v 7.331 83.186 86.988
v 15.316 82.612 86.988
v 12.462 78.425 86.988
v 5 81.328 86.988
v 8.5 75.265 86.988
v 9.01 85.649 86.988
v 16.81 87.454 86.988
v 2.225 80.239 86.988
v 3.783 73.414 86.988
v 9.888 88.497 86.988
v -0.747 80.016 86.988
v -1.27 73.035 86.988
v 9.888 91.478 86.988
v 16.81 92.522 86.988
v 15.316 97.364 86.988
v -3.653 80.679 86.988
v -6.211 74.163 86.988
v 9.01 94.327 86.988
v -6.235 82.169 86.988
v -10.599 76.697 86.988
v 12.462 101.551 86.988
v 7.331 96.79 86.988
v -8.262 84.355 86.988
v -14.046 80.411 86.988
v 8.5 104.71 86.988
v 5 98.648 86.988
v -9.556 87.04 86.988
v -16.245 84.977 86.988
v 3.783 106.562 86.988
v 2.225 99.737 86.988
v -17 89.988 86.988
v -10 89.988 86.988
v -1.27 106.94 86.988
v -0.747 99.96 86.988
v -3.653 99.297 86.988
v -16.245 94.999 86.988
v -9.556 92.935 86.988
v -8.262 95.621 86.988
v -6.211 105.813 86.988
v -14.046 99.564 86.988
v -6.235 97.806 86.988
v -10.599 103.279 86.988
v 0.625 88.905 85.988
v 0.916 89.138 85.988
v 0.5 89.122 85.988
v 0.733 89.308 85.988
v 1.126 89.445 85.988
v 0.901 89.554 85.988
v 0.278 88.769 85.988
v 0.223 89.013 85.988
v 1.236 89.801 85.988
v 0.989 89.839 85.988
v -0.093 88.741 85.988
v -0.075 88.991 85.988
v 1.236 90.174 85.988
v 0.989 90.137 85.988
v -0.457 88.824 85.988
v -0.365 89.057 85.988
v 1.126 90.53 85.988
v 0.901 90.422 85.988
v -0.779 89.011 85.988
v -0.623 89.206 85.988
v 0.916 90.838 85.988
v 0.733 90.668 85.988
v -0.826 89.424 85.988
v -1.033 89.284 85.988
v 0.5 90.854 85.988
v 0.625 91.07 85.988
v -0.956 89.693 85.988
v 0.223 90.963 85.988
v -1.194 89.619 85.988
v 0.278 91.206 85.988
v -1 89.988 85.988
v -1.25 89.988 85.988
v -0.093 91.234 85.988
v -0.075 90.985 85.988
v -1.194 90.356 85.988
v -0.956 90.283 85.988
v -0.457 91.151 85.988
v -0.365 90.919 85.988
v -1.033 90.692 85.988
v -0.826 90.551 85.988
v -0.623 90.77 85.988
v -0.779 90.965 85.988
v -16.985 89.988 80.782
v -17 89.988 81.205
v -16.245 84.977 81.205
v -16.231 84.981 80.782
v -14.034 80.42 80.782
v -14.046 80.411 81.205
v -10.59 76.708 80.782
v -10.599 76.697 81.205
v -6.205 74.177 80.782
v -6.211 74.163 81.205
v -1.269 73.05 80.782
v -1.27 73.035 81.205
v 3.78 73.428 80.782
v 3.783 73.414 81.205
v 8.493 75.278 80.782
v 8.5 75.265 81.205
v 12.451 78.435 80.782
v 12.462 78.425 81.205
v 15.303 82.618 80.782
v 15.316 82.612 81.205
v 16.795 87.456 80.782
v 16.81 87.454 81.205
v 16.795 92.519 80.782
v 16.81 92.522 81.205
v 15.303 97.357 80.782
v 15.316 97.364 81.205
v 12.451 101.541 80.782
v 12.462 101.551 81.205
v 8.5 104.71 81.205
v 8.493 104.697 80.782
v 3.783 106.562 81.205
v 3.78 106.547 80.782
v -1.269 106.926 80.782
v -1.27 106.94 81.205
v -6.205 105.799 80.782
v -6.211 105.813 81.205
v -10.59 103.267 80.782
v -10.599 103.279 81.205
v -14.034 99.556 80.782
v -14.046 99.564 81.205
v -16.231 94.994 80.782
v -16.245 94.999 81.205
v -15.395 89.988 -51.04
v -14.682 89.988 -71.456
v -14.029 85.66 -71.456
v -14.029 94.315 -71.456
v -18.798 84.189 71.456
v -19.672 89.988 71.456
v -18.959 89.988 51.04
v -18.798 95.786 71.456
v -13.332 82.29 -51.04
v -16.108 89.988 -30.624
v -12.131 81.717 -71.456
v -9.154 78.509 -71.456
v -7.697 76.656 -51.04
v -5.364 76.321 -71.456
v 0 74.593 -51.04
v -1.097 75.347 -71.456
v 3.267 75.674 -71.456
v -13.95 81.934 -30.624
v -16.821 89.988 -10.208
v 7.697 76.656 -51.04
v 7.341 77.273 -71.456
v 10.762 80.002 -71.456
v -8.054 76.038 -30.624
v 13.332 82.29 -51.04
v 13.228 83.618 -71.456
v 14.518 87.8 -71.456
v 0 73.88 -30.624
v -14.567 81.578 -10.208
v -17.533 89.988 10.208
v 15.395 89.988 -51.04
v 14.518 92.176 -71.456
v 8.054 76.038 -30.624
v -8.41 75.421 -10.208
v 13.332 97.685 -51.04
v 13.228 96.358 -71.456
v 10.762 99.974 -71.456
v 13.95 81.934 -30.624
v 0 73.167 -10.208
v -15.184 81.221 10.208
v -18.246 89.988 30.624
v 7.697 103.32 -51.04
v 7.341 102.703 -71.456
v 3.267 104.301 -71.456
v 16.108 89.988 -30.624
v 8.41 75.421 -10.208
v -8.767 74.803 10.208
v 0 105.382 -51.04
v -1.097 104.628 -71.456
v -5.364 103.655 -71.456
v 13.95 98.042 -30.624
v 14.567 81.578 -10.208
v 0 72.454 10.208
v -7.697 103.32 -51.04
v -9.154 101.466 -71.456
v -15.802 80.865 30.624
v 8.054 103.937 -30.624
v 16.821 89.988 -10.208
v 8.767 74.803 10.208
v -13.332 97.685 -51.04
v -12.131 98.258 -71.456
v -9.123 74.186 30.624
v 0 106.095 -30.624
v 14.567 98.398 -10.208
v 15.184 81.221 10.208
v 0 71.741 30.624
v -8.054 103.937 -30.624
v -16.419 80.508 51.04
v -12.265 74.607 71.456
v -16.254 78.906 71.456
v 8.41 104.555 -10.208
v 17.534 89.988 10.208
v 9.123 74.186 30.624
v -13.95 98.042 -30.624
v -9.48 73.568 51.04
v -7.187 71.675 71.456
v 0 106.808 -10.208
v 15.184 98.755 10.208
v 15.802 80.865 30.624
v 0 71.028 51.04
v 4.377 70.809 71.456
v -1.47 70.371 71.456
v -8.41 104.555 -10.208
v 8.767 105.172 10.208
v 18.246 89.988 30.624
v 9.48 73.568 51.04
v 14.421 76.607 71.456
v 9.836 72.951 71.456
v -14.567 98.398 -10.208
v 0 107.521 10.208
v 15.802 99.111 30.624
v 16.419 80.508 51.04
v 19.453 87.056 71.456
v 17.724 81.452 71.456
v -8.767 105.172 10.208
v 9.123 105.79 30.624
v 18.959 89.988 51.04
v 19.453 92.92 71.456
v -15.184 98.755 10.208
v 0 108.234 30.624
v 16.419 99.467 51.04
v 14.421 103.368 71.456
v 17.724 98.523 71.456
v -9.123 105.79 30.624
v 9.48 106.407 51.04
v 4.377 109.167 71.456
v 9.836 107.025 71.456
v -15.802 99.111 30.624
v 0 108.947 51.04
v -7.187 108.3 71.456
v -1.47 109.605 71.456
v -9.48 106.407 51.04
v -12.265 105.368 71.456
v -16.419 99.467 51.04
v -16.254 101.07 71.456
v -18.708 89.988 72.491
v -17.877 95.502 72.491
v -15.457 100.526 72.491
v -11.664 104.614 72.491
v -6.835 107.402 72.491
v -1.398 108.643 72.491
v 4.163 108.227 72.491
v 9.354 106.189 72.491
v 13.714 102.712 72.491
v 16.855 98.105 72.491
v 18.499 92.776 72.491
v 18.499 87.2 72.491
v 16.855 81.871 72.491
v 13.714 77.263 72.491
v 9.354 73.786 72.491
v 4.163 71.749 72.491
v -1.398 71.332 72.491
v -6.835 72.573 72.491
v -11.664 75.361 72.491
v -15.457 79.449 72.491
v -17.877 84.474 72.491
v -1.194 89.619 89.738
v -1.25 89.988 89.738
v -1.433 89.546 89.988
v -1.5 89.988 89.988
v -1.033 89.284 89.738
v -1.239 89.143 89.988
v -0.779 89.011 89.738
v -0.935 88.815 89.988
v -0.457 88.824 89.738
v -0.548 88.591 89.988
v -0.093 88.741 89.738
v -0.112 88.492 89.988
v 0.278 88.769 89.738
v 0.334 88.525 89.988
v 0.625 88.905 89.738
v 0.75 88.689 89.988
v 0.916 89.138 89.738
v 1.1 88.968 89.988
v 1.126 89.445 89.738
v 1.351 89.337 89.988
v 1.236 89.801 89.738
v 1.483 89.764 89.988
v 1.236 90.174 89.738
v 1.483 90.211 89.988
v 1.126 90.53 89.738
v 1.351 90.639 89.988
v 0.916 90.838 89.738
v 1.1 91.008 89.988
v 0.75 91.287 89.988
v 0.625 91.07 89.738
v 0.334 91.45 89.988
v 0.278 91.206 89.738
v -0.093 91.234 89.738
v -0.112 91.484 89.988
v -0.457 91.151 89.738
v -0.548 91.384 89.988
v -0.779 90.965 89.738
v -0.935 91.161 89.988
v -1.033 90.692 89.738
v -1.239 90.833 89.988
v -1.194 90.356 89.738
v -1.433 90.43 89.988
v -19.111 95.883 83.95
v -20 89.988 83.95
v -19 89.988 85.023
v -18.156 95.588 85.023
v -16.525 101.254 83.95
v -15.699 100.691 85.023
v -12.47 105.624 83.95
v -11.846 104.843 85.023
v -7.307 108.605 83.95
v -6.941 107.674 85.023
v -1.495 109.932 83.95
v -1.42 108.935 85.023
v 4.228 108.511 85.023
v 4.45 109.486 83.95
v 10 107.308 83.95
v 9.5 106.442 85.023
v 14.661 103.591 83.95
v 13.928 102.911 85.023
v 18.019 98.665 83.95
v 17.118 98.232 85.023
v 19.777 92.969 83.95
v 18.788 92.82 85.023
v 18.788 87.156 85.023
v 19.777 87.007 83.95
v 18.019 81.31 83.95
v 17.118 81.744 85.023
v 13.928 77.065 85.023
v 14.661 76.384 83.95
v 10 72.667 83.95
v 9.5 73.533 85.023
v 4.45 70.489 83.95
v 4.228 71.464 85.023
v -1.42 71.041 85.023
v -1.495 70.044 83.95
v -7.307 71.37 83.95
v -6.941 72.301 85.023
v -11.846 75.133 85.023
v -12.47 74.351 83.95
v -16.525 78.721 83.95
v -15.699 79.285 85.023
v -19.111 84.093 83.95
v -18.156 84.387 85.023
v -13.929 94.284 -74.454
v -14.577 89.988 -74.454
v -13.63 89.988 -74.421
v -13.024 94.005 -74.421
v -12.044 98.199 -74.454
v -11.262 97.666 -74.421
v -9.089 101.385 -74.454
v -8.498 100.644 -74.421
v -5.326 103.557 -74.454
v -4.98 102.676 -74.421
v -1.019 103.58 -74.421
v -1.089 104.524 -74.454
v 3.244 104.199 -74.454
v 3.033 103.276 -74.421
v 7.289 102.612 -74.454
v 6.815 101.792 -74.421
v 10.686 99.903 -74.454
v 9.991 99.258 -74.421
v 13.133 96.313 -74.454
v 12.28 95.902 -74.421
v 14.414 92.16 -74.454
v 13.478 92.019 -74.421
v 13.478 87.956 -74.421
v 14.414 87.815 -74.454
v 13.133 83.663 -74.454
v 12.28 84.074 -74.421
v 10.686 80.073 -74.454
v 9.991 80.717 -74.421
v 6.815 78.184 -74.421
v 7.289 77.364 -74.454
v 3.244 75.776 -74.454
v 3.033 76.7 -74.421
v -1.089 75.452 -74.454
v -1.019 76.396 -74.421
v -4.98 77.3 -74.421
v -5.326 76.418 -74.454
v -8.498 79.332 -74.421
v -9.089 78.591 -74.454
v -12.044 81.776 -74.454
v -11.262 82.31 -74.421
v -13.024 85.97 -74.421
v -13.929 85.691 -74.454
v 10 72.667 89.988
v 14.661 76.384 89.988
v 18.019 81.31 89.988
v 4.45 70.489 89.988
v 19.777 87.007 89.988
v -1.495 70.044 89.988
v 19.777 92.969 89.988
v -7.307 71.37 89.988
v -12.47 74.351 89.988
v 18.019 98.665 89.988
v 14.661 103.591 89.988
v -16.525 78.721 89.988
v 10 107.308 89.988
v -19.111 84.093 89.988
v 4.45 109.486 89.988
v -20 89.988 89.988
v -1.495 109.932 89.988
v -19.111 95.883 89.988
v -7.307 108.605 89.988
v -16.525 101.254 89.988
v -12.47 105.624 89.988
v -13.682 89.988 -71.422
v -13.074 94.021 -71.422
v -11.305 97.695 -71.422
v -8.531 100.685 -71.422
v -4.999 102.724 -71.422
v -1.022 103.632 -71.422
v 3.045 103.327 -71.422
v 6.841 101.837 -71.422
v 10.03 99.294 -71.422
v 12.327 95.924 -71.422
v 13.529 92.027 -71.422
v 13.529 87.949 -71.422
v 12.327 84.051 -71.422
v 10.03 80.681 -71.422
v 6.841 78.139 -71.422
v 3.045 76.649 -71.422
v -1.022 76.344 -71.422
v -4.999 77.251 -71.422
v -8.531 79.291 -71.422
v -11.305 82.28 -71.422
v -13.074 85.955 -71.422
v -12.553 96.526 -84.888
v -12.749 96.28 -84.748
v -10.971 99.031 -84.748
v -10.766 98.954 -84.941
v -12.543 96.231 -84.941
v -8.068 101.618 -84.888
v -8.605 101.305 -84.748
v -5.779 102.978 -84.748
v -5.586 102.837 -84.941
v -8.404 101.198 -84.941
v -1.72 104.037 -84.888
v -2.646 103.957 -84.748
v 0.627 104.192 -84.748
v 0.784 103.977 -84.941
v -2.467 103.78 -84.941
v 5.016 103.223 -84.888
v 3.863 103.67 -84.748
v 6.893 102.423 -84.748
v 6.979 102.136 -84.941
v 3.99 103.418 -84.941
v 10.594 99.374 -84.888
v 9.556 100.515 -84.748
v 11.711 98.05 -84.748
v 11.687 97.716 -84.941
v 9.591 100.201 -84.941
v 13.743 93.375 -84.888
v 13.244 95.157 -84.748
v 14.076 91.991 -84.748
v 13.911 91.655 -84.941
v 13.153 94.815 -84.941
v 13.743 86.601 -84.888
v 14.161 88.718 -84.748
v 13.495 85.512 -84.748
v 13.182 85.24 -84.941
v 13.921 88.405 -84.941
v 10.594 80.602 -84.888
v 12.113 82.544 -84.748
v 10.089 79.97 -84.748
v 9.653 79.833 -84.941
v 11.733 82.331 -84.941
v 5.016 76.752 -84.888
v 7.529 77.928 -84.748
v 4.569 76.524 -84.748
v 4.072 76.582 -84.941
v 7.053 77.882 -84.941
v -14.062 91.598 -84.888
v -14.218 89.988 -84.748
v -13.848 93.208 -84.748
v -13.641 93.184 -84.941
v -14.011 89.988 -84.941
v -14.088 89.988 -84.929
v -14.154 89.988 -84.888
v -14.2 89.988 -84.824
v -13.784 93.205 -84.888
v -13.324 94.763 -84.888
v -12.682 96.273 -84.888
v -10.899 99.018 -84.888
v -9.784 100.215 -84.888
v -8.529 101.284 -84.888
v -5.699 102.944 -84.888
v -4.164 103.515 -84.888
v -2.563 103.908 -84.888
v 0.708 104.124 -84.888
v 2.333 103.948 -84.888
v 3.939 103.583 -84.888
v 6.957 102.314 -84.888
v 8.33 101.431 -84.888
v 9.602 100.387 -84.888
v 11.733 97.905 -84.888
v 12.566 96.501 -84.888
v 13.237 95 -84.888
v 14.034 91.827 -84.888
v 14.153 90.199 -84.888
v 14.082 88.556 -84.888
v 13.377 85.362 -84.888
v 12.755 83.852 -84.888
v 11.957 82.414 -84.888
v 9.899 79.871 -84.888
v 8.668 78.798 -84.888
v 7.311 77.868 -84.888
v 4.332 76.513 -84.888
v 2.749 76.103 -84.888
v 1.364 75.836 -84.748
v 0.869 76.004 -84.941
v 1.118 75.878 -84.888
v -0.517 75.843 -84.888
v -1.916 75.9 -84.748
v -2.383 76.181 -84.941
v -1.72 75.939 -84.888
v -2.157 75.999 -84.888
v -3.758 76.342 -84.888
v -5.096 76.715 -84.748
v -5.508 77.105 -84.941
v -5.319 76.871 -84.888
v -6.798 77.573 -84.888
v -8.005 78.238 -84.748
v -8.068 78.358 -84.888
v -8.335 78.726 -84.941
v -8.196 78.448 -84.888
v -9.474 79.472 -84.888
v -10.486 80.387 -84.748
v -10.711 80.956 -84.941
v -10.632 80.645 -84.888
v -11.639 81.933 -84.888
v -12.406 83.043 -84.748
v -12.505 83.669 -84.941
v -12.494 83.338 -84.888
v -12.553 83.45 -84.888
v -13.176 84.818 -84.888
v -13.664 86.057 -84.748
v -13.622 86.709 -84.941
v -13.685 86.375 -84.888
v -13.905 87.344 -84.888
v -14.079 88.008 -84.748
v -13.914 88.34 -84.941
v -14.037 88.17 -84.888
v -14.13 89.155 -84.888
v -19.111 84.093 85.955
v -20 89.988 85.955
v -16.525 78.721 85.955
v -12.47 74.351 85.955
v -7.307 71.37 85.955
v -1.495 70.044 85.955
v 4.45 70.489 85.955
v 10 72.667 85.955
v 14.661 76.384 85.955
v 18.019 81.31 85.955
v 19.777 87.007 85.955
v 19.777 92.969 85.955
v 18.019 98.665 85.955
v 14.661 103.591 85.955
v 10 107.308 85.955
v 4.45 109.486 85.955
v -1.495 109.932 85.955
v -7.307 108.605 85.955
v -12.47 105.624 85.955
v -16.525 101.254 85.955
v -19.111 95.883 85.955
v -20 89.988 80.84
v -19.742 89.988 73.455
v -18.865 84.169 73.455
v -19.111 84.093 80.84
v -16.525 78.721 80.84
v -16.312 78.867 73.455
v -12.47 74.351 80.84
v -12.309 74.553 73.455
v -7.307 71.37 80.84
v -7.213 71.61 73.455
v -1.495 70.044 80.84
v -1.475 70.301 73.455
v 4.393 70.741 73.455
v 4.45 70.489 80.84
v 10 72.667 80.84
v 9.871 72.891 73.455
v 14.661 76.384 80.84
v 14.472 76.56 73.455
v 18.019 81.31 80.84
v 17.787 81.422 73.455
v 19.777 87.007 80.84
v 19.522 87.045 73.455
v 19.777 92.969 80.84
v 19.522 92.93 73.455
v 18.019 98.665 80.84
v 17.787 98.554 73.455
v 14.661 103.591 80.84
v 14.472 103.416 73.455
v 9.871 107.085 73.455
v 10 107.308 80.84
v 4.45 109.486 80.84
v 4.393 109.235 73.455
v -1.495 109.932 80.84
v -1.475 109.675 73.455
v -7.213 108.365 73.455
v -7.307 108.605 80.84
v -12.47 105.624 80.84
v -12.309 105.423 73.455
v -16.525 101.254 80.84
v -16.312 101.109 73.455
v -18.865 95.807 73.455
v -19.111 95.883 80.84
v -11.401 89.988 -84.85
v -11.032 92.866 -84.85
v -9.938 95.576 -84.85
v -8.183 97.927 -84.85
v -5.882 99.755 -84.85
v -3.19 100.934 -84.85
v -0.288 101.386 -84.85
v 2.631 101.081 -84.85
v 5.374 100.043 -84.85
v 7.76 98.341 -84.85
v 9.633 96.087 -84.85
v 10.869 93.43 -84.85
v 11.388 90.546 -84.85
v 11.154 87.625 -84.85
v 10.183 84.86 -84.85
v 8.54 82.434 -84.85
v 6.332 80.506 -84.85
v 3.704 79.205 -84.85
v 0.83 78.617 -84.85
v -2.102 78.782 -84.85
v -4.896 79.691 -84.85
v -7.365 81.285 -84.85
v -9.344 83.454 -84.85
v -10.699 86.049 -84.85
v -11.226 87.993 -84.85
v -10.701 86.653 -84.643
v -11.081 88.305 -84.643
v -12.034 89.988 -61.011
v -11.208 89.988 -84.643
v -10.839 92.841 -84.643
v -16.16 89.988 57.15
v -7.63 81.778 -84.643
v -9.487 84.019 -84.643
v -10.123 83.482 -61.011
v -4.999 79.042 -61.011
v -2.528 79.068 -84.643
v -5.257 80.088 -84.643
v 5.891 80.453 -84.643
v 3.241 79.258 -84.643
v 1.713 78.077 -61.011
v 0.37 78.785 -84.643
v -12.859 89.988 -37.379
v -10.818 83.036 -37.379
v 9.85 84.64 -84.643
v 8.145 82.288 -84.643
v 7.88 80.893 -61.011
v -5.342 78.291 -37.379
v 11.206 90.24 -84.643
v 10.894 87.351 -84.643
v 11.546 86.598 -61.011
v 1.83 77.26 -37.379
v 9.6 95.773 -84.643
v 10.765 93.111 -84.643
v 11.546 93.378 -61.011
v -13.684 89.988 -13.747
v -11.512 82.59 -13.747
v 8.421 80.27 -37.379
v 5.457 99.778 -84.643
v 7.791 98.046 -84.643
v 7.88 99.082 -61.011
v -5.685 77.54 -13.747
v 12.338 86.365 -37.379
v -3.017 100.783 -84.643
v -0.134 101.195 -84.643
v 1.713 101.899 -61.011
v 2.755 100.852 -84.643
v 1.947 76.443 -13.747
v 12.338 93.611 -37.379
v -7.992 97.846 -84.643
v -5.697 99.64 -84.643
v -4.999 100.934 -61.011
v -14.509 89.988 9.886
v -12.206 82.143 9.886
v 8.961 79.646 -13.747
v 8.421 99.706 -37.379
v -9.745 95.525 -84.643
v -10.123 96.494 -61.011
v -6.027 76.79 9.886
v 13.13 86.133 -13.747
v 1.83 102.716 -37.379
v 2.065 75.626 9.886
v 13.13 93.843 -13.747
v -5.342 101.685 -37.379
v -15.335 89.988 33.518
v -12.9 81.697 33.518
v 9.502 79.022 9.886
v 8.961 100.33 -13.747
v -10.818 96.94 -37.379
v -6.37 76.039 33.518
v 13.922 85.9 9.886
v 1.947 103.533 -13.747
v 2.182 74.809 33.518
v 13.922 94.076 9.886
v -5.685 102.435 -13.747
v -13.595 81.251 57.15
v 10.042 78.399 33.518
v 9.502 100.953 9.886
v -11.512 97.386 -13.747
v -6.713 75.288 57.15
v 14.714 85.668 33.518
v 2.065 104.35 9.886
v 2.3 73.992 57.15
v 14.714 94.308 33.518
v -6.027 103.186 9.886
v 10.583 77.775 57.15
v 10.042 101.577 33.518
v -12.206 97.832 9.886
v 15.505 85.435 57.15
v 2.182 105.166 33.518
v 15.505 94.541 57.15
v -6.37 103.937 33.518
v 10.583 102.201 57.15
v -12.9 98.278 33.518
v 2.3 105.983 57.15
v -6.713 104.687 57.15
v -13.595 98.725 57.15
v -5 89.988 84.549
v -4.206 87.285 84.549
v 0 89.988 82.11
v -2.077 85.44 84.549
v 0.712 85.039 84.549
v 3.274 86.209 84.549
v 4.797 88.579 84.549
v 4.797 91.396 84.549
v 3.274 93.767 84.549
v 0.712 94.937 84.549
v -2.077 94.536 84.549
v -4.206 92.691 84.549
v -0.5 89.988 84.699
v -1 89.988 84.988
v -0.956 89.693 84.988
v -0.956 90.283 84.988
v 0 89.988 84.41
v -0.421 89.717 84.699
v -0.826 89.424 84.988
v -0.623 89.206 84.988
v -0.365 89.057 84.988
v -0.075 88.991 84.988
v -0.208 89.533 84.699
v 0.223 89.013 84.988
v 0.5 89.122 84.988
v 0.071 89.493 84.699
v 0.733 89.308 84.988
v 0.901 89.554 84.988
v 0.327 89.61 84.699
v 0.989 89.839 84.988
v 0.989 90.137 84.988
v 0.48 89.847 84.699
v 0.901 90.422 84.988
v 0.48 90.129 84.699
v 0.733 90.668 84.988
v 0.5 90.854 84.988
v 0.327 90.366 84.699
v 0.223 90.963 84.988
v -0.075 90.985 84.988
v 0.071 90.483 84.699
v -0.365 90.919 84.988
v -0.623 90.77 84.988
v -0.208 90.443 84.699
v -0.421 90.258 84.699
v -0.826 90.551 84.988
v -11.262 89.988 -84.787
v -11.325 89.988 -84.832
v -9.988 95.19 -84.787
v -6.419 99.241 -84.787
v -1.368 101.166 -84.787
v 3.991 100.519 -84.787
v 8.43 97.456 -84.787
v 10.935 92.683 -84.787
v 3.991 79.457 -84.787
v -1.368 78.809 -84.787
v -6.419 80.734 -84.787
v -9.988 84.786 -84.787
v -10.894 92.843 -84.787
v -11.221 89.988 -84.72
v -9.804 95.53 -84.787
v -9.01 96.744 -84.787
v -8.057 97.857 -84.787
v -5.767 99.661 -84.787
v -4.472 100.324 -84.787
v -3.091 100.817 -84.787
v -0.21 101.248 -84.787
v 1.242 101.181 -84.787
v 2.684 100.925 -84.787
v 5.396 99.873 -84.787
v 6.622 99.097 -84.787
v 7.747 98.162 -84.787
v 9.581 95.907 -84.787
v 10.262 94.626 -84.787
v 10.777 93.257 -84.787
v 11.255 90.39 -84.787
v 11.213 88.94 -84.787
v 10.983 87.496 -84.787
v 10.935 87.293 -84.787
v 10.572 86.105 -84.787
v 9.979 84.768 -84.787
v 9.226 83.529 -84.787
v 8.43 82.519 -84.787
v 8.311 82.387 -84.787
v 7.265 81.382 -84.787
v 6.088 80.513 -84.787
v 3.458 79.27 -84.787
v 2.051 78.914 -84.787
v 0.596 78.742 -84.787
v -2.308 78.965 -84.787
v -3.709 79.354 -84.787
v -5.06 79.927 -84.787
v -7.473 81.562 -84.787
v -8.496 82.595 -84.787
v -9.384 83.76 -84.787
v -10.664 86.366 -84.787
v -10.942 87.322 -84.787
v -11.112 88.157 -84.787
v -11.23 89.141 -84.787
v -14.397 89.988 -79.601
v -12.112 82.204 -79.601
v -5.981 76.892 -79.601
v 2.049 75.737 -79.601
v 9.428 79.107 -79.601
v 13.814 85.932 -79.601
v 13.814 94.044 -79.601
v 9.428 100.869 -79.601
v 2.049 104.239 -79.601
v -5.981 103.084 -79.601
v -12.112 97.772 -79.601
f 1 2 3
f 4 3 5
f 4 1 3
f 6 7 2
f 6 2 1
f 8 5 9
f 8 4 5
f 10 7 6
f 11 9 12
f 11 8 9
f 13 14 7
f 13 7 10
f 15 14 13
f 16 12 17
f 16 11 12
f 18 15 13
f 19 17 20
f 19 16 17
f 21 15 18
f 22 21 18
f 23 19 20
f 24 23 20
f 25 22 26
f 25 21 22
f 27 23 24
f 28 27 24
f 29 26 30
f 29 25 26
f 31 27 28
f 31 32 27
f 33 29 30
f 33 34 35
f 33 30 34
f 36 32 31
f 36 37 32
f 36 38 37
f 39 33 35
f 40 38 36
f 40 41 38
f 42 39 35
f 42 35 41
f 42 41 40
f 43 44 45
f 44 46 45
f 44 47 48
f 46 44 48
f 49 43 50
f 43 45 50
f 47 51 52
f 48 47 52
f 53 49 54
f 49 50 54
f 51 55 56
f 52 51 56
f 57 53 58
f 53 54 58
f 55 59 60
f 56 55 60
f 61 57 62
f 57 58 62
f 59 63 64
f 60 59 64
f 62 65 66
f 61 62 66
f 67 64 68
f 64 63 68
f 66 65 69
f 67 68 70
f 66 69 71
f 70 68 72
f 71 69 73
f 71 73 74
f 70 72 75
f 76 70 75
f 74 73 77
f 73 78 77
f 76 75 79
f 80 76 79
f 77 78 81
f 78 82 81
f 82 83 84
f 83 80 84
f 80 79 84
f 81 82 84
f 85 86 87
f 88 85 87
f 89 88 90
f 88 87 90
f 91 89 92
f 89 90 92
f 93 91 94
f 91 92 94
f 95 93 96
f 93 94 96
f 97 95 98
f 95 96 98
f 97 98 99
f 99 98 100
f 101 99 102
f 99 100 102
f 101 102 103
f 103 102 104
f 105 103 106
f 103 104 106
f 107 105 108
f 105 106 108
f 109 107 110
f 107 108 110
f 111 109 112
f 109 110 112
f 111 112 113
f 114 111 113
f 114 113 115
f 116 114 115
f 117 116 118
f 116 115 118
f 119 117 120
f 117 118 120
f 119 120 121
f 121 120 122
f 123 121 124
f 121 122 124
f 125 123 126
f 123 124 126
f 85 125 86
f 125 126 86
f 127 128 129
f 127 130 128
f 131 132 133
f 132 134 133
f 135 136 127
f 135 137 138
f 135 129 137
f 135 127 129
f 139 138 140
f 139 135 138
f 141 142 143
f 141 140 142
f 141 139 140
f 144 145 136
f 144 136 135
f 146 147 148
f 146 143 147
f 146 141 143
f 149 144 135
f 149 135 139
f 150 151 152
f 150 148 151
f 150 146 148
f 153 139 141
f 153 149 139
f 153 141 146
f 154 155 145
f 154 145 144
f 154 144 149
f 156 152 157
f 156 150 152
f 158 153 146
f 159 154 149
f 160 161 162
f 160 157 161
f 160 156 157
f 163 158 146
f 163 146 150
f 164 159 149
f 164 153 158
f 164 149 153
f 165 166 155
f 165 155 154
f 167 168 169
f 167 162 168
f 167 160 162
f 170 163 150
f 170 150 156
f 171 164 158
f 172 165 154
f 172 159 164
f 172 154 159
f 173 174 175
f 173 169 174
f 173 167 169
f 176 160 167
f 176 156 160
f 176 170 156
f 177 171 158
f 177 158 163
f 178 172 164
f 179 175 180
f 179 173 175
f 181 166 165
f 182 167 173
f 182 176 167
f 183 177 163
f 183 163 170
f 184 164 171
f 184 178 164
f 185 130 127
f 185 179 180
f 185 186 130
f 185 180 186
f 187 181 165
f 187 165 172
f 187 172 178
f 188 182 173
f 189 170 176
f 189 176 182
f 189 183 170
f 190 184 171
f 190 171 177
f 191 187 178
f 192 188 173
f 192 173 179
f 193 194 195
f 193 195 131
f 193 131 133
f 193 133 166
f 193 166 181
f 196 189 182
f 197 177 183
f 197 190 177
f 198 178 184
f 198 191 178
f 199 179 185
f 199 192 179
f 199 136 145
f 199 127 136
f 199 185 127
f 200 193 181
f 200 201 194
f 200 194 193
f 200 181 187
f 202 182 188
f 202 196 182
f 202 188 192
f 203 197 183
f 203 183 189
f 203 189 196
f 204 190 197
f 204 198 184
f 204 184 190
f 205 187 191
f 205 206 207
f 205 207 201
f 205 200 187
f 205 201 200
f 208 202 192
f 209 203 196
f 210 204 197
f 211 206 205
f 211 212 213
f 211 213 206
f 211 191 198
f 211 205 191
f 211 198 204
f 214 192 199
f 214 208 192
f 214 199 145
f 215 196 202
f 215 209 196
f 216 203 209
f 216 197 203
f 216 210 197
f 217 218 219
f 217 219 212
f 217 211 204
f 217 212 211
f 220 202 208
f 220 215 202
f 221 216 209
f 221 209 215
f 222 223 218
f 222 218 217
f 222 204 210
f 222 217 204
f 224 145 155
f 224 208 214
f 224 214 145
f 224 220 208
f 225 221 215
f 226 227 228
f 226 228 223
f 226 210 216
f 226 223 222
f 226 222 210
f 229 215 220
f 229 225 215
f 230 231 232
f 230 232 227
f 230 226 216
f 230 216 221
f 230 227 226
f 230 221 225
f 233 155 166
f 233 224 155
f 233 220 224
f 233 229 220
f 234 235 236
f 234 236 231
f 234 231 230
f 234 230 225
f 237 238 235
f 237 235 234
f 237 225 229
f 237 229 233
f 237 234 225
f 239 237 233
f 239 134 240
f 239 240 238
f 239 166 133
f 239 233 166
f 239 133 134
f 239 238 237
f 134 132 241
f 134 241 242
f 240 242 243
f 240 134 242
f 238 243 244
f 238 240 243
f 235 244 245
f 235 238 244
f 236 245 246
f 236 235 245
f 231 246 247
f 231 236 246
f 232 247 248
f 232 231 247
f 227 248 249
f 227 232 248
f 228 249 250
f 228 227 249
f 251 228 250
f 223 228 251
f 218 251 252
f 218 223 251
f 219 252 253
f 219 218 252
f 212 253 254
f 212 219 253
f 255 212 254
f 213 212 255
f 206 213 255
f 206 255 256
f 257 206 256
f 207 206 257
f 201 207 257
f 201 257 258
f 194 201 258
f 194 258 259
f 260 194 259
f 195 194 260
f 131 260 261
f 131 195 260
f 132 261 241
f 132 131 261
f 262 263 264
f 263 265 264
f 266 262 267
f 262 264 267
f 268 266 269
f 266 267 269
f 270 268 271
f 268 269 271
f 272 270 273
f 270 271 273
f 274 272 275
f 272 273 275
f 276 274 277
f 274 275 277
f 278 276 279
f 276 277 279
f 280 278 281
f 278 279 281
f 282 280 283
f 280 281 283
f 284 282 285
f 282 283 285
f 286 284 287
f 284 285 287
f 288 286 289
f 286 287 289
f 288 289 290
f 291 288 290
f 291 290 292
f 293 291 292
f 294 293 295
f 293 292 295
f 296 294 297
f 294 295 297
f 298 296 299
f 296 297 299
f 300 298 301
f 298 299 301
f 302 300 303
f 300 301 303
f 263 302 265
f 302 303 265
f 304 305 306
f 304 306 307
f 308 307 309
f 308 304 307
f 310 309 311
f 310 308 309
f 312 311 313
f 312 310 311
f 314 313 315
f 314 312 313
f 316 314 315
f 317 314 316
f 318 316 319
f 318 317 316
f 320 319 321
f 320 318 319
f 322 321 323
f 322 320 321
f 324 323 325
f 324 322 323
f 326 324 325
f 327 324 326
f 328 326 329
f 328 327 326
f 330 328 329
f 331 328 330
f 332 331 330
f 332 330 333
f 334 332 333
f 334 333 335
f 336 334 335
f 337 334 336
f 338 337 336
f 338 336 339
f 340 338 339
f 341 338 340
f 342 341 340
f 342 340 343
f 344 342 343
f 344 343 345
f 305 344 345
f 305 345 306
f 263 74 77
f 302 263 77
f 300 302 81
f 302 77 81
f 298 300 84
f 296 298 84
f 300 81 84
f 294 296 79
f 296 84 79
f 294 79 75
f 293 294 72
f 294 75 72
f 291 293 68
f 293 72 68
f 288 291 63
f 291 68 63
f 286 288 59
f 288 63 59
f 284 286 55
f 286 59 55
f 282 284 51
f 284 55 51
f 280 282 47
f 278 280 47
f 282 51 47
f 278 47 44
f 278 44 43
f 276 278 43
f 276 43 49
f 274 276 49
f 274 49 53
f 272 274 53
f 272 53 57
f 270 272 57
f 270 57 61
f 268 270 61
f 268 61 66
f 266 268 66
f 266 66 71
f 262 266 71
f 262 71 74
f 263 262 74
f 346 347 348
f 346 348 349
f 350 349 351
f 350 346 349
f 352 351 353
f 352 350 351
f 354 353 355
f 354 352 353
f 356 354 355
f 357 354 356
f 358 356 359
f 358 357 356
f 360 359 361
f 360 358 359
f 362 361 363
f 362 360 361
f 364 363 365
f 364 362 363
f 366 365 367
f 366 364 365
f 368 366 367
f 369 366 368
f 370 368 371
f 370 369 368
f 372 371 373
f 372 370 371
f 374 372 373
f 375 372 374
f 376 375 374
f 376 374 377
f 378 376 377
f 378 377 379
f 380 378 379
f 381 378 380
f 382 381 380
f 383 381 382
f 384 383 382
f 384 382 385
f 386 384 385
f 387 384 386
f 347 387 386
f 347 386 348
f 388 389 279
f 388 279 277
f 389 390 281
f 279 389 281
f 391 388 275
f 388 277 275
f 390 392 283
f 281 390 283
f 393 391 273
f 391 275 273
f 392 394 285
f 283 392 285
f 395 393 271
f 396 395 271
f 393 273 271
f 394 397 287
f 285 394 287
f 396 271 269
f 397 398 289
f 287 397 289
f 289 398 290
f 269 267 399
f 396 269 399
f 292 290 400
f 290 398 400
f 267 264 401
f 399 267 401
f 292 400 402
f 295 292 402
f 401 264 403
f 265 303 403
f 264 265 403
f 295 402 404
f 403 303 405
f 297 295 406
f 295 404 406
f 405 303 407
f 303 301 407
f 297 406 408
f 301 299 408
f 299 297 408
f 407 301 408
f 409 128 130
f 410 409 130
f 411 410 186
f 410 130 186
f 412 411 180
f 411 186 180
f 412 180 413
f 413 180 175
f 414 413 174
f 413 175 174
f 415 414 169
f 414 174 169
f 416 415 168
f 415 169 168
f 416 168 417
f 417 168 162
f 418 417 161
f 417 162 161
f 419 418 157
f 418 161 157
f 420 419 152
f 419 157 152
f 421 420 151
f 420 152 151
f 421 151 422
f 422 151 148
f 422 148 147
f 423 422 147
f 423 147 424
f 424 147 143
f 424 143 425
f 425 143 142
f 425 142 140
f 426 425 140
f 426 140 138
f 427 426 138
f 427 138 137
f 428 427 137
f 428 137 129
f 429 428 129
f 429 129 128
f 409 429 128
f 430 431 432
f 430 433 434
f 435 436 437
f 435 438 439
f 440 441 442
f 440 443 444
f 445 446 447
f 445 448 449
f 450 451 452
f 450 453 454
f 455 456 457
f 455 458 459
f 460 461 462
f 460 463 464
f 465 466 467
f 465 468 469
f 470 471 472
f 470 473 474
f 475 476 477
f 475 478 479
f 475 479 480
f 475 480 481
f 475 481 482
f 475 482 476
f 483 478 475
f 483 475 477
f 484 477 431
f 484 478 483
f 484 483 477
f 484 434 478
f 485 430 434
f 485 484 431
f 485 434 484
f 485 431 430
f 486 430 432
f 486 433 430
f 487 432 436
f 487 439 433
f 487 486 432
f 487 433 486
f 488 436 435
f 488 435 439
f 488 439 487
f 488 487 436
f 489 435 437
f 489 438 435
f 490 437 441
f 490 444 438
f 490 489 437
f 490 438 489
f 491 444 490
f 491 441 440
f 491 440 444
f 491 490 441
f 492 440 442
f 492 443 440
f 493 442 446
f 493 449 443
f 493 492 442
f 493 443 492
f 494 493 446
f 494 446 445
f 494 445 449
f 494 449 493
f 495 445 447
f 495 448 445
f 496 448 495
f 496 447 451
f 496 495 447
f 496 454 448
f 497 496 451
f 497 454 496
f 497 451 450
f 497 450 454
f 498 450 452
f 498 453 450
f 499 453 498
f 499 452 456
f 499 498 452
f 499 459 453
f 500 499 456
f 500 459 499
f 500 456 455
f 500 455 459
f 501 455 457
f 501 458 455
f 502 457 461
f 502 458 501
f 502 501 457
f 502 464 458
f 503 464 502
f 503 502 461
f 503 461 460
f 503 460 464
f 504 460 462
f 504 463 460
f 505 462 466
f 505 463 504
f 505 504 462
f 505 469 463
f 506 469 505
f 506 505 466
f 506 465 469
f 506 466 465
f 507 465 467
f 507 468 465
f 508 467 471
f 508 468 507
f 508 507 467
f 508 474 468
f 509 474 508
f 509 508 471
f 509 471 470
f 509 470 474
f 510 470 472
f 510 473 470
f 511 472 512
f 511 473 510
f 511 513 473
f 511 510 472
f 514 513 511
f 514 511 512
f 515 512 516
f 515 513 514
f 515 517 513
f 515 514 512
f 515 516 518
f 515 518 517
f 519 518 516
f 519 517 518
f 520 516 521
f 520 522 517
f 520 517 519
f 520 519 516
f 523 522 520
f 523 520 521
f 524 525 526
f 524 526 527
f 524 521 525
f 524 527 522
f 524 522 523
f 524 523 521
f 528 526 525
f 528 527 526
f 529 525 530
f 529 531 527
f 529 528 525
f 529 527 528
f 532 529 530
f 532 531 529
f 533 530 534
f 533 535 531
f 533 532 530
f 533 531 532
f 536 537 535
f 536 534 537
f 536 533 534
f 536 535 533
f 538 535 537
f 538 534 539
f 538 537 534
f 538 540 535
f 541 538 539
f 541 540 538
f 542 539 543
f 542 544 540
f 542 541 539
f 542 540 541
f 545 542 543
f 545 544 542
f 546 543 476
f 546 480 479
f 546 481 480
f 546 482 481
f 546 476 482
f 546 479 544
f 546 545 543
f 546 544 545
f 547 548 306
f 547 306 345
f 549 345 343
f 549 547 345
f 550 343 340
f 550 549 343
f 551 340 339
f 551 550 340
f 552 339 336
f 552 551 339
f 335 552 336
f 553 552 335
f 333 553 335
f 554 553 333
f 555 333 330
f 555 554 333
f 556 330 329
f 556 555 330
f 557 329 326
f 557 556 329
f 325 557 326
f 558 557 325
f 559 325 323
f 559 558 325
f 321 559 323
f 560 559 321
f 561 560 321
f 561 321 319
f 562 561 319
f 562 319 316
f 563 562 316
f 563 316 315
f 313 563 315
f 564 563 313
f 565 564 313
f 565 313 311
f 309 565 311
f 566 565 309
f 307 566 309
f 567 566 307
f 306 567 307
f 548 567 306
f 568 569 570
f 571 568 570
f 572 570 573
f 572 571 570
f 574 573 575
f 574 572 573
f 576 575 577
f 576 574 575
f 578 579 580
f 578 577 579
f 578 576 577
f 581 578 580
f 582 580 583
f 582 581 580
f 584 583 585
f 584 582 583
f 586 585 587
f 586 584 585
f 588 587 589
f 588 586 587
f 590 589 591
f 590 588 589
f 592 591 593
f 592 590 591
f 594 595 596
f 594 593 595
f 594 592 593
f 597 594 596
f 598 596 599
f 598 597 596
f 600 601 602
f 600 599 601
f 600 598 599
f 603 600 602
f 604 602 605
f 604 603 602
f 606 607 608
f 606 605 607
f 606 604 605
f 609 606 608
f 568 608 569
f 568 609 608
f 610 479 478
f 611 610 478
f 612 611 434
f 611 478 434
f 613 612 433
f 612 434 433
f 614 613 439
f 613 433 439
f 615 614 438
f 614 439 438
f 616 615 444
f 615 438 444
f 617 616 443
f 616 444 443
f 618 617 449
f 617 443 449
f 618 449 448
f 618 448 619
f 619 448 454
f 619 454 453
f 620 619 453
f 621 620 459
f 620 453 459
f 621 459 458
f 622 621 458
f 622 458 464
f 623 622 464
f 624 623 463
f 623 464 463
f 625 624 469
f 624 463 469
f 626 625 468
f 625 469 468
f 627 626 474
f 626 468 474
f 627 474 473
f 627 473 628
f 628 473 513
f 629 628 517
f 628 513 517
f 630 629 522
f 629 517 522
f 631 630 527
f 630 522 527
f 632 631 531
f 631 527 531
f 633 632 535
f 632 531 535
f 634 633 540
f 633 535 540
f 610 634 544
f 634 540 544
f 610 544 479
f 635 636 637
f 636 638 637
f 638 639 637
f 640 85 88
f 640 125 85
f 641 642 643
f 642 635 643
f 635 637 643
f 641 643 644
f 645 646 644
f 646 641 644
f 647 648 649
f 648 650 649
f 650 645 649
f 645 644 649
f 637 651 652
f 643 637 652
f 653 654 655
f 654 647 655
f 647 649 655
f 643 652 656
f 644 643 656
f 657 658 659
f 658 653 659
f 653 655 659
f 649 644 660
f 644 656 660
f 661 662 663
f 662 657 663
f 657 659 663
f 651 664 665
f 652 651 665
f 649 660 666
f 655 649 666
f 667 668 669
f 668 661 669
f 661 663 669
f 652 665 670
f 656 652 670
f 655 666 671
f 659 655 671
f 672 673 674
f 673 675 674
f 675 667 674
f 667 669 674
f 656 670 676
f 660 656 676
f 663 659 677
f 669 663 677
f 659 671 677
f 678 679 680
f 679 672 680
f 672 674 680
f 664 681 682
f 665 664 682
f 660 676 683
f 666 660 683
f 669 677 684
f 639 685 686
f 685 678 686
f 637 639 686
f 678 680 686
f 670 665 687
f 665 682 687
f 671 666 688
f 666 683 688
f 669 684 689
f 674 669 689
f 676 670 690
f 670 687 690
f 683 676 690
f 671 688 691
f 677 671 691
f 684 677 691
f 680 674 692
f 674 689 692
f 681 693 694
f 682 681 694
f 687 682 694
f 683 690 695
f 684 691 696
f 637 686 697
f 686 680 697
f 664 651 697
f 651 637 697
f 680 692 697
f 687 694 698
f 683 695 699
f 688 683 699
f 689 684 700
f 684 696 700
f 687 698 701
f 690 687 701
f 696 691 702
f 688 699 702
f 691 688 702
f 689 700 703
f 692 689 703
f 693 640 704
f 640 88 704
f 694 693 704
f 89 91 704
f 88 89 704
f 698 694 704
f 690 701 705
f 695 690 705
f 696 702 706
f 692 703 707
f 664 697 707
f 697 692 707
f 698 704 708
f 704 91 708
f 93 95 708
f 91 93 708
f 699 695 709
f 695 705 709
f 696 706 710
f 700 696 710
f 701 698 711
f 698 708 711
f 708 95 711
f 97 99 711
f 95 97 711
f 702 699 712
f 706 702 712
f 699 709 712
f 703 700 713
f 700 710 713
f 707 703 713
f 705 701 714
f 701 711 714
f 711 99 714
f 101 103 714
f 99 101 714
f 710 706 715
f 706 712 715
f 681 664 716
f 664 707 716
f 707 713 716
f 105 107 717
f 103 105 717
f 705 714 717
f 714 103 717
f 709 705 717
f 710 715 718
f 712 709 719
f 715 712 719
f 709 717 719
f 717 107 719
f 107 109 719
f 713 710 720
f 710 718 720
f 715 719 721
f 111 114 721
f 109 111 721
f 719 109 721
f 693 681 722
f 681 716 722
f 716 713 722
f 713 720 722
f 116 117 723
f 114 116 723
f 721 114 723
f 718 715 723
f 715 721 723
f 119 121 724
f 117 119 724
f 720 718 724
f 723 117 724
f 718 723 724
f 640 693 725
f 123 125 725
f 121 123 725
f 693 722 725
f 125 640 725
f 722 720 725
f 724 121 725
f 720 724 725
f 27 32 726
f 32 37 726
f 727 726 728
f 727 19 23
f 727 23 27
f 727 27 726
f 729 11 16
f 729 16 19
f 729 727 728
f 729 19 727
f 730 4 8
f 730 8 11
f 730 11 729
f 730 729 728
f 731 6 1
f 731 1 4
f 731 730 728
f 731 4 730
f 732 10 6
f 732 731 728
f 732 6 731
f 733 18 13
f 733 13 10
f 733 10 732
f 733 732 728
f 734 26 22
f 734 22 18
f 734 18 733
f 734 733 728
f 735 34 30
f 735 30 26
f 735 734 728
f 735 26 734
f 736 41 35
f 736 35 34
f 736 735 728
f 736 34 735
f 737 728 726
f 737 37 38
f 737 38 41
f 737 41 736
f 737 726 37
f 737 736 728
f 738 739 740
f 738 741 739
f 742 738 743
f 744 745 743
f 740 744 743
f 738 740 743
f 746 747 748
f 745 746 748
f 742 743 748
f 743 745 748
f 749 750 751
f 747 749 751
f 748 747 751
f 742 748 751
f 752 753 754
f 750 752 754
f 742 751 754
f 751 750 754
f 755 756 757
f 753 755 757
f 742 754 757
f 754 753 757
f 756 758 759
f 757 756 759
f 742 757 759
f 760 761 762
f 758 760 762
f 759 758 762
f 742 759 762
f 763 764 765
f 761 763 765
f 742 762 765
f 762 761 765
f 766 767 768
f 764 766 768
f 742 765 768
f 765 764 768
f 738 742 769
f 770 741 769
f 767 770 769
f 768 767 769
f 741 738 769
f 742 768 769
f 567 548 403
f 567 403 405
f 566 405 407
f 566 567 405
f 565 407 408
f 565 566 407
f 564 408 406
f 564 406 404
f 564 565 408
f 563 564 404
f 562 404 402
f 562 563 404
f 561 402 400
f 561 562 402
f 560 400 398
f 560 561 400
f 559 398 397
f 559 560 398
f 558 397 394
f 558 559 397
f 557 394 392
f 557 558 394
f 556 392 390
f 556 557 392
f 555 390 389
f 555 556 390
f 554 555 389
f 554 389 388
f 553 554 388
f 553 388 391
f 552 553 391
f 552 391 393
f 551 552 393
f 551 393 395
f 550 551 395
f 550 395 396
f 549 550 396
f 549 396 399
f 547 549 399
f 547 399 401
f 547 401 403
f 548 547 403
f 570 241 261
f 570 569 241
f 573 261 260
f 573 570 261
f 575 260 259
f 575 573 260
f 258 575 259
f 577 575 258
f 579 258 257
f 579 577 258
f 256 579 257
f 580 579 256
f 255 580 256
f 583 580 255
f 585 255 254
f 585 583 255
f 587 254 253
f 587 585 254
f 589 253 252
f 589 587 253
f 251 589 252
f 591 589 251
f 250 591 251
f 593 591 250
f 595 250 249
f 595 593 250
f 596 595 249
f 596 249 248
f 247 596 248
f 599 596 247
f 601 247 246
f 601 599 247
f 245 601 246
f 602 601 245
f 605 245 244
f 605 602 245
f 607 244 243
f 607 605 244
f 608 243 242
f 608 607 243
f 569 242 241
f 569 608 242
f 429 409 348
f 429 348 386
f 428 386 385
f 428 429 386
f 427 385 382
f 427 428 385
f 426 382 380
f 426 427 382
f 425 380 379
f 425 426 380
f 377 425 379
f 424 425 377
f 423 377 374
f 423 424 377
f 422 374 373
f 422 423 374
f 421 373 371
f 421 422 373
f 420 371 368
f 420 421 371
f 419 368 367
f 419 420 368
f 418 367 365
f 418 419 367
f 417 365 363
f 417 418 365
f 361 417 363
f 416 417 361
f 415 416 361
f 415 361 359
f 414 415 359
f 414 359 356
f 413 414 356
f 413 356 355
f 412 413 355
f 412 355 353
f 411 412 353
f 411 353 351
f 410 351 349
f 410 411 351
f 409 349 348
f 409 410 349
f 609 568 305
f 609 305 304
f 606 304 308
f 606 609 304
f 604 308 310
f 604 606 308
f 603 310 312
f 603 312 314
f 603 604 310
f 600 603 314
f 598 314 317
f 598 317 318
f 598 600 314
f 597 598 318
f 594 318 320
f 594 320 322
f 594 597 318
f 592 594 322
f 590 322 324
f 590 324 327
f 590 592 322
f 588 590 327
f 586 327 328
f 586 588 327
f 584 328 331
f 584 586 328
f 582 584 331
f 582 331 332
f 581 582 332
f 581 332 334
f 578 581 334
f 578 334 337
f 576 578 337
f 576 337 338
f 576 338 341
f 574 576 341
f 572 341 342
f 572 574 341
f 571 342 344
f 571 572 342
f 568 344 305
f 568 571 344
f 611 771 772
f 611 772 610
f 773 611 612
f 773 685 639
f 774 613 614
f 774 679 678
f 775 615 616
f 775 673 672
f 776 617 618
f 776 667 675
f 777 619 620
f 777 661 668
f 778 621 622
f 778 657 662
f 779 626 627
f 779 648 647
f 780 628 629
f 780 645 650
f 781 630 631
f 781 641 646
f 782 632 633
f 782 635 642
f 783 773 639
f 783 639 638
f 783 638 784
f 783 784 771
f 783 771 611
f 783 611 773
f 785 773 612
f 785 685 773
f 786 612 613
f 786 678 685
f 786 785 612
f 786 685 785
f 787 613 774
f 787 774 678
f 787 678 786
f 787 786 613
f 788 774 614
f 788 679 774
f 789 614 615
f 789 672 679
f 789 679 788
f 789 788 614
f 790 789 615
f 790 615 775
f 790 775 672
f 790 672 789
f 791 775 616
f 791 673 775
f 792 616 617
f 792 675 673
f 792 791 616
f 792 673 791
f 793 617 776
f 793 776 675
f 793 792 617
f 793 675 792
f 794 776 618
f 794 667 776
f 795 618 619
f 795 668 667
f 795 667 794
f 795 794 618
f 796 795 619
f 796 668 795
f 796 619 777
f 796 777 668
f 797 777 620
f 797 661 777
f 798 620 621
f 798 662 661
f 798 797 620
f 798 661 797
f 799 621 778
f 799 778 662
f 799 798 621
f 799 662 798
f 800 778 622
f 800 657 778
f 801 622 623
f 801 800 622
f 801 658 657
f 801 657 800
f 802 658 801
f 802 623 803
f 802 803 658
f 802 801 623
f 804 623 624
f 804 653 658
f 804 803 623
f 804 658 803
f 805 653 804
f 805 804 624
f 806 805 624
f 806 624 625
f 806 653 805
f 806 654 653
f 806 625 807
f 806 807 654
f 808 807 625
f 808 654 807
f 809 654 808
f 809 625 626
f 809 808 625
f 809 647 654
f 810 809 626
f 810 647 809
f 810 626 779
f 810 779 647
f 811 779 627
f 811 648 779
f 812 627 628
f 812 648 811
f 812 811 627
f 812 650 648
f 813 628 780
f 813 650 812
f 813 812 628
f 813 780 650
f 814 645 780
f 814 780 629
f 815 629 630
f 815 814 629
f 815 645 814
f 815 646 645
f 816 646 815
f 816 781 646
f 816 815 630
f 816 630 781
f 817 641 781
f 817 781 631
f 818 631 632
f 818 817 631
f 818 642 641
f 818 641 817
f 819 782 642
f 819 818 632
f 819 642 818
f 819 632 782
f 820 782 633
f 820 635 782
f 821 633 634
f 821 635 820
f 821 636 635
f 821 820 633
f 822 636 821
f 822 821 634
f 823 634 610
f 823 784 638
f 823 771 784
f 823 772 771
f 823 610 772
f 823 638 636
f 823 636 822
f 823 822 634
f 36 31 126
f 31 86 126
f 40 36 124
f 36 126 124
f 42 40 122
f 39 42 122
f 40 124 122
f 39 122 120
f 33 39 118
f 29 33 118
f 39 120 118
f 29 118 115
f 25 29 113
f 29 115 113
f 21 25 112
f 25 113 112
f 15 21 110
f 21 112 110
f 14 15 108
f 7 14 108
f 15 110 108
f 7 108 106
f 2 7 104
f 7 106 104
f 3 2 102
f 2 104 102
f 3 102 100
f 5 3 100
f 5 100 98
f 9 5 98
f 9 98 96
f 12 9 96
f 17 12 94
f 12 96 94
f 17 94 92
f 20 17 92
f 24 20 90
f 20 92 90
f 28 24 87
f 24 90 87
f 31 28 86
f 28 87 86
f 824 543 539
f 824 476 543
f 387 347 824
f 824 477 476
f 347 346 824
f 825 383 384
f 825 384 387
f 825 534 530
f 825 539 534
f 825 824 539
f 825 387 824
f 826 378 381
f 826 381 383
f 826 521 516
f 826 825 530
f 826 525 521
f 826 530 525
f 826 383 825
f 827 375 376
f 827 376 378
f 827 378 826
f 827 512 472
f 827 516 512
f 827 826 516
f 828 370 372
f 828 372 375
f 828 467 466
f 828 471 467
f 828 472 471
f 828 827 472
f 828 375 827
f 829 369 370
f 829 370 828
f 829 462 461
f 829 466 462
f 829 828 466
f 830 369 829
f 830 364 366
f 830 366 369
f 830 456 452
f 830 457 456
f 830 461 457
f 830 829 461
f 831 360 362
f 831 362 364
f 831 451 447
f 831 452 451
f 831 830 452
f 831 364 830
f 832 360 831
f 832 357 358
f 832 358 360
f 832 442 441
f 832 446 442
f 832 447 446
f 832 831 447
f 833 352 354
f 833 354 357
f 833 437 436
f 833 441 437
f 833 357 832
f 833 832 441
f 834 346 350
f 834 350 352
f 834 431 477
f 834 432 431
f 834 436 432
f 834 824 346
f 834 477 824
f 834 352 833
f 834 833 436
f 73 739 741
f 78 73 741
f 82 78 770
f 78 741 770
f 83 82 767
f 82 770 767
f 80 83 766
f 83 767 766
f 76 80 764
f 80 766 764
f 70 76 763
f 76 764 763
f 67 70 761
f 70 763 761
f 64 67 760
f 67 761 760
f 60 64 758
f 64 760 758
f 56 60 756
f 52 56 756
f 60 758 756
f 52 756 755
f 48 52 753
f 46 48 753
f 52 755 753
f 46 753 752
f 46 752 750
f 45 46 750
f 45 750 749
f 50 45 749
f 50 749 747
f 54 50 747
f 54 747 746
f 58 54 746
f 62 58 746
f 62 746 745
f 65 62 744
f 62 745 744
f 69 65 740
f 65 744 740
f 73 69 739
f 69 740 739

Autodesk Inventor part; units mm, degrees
ref_plane "YZ Plane" through (0, 0, 0) normal (1, 0, 0) x (0, 1, 0)
ref_plane "XZ Plane" through (0, 0, 0) normal (0, 1, 0) x (-1, 0, 0)
ref_plane "XY Plane" through (0, 0, 0) normal (0, 0, 1) x (1, 0, 0)
sketch "Sketch1" plane through (0, 0, 0) normal (1, 0, 0) x (0, 1, 0)
  line L0 (-20, 0) -> (174.936, 0)
  line L1 (0, 0) -> (0, -20)
  line L2 (0, -20) -> (9.148, -20)
  line L3 (9.148, -20) -> (174.936, -14.2106)
  line L4 (174.936, 0) -> (174.936, -14.2106)
  line L5 (3, -10) -> (3, -17)
  line L6 (7.8773, 0) -> (3, -10)
  line L7 (7.8773, 0) -> (19.0033, 0) construction
  line L8 (9.2055, 0) -> (9.2055, -16.9852)
  line L9 (8.783, -17) -> (174.936, -11.1978)
  line L10 (3, -17) -> (8.783, -17)
  line L11 (174.936, -14.2106) -> (174.831, -11.2015)
  line L12 (6.0374, -20) -> (4.9651, -19)
  line L13 (4.9651, -19) -> (4.0326, -20)
  line L14 (4.9651, -19) -> (5, -20)
  line L15 (17.532, -19.7072) -> (17.4971, -18.7078)
  line L16 (17.4971, -18.7078) -> (18.5314, -19.6723)
  line L17 (17.4971, -18.7078) -> (16.5326, -19.7421)
  line L18 (164.442, -14.577) -> (161.4443, -14.6817)
  line L19 (161.4443, -14.6817) -> (161.4094, -13.6823)
  line L20 (161.4094, -13.6823) -> (164.4089, -13.6299)
  line L21 (164.4089, -13.6299) -> (164.442, -14.577)
  line L22 (0.5, 0) -> (0.5, -1)
  line L23 (0, -1.5) -> (0.5, -1)
  line L24 (0.5, -1) -> (5, -1)
  line L25 (5, -1) -> (5.5774, 0)
  line L26 (0.25, -1.25) -> (4, -1.25)
  line L27 (4, -1.25) -> (4, 0)
  point P0 (4, -1)
  dimension "d1" = 20
  dimension "d5" = 3
  dimension "d18" = 90
  dimension "d22" = 5
  dimension "d23" = 1
  dimension "d24" = 1
  dimension "d25" = 157.5
  dimension "d26" = 3
  dimension "d27" = 1
  dimension "d28" = 13.5
  dimension "d43" = 88
  dimension "d45" = 17
revolve "Revolution1" add sketch "Sketch1" angle 360 about axis through (0, -20, 0) along (0, 1, 0) contours L23 L26 L27 L24 L25 L0 L6 L5 L10 L9 L11 L3 L21 L20 L19 L16 L17 L2 L12 L13 L1
fillet "Fillet1" radius 0.2 2 edges at (0, 174.936, 14.2106) (0, 174.831, 11.2015)
thread "Thread2" size "M2.5x0.45" class "6H" standard "ANSI Metric M Profile" length 3.5
move or copy body "Поворот1" bodies to move or copy 1 copy no rotation origin (0, 0, 0) rotation axis (0, 0, 1) rotation angle -90 translate (-89.9878, 89.9878, 0)
move or copy body "Поворот2" bodies to move or copy 1 copy no rotation origin (0, 0, 0) rotation axis (0, 1, 0) rotation angle 90
properties material "Aluminum 2014-T6"
